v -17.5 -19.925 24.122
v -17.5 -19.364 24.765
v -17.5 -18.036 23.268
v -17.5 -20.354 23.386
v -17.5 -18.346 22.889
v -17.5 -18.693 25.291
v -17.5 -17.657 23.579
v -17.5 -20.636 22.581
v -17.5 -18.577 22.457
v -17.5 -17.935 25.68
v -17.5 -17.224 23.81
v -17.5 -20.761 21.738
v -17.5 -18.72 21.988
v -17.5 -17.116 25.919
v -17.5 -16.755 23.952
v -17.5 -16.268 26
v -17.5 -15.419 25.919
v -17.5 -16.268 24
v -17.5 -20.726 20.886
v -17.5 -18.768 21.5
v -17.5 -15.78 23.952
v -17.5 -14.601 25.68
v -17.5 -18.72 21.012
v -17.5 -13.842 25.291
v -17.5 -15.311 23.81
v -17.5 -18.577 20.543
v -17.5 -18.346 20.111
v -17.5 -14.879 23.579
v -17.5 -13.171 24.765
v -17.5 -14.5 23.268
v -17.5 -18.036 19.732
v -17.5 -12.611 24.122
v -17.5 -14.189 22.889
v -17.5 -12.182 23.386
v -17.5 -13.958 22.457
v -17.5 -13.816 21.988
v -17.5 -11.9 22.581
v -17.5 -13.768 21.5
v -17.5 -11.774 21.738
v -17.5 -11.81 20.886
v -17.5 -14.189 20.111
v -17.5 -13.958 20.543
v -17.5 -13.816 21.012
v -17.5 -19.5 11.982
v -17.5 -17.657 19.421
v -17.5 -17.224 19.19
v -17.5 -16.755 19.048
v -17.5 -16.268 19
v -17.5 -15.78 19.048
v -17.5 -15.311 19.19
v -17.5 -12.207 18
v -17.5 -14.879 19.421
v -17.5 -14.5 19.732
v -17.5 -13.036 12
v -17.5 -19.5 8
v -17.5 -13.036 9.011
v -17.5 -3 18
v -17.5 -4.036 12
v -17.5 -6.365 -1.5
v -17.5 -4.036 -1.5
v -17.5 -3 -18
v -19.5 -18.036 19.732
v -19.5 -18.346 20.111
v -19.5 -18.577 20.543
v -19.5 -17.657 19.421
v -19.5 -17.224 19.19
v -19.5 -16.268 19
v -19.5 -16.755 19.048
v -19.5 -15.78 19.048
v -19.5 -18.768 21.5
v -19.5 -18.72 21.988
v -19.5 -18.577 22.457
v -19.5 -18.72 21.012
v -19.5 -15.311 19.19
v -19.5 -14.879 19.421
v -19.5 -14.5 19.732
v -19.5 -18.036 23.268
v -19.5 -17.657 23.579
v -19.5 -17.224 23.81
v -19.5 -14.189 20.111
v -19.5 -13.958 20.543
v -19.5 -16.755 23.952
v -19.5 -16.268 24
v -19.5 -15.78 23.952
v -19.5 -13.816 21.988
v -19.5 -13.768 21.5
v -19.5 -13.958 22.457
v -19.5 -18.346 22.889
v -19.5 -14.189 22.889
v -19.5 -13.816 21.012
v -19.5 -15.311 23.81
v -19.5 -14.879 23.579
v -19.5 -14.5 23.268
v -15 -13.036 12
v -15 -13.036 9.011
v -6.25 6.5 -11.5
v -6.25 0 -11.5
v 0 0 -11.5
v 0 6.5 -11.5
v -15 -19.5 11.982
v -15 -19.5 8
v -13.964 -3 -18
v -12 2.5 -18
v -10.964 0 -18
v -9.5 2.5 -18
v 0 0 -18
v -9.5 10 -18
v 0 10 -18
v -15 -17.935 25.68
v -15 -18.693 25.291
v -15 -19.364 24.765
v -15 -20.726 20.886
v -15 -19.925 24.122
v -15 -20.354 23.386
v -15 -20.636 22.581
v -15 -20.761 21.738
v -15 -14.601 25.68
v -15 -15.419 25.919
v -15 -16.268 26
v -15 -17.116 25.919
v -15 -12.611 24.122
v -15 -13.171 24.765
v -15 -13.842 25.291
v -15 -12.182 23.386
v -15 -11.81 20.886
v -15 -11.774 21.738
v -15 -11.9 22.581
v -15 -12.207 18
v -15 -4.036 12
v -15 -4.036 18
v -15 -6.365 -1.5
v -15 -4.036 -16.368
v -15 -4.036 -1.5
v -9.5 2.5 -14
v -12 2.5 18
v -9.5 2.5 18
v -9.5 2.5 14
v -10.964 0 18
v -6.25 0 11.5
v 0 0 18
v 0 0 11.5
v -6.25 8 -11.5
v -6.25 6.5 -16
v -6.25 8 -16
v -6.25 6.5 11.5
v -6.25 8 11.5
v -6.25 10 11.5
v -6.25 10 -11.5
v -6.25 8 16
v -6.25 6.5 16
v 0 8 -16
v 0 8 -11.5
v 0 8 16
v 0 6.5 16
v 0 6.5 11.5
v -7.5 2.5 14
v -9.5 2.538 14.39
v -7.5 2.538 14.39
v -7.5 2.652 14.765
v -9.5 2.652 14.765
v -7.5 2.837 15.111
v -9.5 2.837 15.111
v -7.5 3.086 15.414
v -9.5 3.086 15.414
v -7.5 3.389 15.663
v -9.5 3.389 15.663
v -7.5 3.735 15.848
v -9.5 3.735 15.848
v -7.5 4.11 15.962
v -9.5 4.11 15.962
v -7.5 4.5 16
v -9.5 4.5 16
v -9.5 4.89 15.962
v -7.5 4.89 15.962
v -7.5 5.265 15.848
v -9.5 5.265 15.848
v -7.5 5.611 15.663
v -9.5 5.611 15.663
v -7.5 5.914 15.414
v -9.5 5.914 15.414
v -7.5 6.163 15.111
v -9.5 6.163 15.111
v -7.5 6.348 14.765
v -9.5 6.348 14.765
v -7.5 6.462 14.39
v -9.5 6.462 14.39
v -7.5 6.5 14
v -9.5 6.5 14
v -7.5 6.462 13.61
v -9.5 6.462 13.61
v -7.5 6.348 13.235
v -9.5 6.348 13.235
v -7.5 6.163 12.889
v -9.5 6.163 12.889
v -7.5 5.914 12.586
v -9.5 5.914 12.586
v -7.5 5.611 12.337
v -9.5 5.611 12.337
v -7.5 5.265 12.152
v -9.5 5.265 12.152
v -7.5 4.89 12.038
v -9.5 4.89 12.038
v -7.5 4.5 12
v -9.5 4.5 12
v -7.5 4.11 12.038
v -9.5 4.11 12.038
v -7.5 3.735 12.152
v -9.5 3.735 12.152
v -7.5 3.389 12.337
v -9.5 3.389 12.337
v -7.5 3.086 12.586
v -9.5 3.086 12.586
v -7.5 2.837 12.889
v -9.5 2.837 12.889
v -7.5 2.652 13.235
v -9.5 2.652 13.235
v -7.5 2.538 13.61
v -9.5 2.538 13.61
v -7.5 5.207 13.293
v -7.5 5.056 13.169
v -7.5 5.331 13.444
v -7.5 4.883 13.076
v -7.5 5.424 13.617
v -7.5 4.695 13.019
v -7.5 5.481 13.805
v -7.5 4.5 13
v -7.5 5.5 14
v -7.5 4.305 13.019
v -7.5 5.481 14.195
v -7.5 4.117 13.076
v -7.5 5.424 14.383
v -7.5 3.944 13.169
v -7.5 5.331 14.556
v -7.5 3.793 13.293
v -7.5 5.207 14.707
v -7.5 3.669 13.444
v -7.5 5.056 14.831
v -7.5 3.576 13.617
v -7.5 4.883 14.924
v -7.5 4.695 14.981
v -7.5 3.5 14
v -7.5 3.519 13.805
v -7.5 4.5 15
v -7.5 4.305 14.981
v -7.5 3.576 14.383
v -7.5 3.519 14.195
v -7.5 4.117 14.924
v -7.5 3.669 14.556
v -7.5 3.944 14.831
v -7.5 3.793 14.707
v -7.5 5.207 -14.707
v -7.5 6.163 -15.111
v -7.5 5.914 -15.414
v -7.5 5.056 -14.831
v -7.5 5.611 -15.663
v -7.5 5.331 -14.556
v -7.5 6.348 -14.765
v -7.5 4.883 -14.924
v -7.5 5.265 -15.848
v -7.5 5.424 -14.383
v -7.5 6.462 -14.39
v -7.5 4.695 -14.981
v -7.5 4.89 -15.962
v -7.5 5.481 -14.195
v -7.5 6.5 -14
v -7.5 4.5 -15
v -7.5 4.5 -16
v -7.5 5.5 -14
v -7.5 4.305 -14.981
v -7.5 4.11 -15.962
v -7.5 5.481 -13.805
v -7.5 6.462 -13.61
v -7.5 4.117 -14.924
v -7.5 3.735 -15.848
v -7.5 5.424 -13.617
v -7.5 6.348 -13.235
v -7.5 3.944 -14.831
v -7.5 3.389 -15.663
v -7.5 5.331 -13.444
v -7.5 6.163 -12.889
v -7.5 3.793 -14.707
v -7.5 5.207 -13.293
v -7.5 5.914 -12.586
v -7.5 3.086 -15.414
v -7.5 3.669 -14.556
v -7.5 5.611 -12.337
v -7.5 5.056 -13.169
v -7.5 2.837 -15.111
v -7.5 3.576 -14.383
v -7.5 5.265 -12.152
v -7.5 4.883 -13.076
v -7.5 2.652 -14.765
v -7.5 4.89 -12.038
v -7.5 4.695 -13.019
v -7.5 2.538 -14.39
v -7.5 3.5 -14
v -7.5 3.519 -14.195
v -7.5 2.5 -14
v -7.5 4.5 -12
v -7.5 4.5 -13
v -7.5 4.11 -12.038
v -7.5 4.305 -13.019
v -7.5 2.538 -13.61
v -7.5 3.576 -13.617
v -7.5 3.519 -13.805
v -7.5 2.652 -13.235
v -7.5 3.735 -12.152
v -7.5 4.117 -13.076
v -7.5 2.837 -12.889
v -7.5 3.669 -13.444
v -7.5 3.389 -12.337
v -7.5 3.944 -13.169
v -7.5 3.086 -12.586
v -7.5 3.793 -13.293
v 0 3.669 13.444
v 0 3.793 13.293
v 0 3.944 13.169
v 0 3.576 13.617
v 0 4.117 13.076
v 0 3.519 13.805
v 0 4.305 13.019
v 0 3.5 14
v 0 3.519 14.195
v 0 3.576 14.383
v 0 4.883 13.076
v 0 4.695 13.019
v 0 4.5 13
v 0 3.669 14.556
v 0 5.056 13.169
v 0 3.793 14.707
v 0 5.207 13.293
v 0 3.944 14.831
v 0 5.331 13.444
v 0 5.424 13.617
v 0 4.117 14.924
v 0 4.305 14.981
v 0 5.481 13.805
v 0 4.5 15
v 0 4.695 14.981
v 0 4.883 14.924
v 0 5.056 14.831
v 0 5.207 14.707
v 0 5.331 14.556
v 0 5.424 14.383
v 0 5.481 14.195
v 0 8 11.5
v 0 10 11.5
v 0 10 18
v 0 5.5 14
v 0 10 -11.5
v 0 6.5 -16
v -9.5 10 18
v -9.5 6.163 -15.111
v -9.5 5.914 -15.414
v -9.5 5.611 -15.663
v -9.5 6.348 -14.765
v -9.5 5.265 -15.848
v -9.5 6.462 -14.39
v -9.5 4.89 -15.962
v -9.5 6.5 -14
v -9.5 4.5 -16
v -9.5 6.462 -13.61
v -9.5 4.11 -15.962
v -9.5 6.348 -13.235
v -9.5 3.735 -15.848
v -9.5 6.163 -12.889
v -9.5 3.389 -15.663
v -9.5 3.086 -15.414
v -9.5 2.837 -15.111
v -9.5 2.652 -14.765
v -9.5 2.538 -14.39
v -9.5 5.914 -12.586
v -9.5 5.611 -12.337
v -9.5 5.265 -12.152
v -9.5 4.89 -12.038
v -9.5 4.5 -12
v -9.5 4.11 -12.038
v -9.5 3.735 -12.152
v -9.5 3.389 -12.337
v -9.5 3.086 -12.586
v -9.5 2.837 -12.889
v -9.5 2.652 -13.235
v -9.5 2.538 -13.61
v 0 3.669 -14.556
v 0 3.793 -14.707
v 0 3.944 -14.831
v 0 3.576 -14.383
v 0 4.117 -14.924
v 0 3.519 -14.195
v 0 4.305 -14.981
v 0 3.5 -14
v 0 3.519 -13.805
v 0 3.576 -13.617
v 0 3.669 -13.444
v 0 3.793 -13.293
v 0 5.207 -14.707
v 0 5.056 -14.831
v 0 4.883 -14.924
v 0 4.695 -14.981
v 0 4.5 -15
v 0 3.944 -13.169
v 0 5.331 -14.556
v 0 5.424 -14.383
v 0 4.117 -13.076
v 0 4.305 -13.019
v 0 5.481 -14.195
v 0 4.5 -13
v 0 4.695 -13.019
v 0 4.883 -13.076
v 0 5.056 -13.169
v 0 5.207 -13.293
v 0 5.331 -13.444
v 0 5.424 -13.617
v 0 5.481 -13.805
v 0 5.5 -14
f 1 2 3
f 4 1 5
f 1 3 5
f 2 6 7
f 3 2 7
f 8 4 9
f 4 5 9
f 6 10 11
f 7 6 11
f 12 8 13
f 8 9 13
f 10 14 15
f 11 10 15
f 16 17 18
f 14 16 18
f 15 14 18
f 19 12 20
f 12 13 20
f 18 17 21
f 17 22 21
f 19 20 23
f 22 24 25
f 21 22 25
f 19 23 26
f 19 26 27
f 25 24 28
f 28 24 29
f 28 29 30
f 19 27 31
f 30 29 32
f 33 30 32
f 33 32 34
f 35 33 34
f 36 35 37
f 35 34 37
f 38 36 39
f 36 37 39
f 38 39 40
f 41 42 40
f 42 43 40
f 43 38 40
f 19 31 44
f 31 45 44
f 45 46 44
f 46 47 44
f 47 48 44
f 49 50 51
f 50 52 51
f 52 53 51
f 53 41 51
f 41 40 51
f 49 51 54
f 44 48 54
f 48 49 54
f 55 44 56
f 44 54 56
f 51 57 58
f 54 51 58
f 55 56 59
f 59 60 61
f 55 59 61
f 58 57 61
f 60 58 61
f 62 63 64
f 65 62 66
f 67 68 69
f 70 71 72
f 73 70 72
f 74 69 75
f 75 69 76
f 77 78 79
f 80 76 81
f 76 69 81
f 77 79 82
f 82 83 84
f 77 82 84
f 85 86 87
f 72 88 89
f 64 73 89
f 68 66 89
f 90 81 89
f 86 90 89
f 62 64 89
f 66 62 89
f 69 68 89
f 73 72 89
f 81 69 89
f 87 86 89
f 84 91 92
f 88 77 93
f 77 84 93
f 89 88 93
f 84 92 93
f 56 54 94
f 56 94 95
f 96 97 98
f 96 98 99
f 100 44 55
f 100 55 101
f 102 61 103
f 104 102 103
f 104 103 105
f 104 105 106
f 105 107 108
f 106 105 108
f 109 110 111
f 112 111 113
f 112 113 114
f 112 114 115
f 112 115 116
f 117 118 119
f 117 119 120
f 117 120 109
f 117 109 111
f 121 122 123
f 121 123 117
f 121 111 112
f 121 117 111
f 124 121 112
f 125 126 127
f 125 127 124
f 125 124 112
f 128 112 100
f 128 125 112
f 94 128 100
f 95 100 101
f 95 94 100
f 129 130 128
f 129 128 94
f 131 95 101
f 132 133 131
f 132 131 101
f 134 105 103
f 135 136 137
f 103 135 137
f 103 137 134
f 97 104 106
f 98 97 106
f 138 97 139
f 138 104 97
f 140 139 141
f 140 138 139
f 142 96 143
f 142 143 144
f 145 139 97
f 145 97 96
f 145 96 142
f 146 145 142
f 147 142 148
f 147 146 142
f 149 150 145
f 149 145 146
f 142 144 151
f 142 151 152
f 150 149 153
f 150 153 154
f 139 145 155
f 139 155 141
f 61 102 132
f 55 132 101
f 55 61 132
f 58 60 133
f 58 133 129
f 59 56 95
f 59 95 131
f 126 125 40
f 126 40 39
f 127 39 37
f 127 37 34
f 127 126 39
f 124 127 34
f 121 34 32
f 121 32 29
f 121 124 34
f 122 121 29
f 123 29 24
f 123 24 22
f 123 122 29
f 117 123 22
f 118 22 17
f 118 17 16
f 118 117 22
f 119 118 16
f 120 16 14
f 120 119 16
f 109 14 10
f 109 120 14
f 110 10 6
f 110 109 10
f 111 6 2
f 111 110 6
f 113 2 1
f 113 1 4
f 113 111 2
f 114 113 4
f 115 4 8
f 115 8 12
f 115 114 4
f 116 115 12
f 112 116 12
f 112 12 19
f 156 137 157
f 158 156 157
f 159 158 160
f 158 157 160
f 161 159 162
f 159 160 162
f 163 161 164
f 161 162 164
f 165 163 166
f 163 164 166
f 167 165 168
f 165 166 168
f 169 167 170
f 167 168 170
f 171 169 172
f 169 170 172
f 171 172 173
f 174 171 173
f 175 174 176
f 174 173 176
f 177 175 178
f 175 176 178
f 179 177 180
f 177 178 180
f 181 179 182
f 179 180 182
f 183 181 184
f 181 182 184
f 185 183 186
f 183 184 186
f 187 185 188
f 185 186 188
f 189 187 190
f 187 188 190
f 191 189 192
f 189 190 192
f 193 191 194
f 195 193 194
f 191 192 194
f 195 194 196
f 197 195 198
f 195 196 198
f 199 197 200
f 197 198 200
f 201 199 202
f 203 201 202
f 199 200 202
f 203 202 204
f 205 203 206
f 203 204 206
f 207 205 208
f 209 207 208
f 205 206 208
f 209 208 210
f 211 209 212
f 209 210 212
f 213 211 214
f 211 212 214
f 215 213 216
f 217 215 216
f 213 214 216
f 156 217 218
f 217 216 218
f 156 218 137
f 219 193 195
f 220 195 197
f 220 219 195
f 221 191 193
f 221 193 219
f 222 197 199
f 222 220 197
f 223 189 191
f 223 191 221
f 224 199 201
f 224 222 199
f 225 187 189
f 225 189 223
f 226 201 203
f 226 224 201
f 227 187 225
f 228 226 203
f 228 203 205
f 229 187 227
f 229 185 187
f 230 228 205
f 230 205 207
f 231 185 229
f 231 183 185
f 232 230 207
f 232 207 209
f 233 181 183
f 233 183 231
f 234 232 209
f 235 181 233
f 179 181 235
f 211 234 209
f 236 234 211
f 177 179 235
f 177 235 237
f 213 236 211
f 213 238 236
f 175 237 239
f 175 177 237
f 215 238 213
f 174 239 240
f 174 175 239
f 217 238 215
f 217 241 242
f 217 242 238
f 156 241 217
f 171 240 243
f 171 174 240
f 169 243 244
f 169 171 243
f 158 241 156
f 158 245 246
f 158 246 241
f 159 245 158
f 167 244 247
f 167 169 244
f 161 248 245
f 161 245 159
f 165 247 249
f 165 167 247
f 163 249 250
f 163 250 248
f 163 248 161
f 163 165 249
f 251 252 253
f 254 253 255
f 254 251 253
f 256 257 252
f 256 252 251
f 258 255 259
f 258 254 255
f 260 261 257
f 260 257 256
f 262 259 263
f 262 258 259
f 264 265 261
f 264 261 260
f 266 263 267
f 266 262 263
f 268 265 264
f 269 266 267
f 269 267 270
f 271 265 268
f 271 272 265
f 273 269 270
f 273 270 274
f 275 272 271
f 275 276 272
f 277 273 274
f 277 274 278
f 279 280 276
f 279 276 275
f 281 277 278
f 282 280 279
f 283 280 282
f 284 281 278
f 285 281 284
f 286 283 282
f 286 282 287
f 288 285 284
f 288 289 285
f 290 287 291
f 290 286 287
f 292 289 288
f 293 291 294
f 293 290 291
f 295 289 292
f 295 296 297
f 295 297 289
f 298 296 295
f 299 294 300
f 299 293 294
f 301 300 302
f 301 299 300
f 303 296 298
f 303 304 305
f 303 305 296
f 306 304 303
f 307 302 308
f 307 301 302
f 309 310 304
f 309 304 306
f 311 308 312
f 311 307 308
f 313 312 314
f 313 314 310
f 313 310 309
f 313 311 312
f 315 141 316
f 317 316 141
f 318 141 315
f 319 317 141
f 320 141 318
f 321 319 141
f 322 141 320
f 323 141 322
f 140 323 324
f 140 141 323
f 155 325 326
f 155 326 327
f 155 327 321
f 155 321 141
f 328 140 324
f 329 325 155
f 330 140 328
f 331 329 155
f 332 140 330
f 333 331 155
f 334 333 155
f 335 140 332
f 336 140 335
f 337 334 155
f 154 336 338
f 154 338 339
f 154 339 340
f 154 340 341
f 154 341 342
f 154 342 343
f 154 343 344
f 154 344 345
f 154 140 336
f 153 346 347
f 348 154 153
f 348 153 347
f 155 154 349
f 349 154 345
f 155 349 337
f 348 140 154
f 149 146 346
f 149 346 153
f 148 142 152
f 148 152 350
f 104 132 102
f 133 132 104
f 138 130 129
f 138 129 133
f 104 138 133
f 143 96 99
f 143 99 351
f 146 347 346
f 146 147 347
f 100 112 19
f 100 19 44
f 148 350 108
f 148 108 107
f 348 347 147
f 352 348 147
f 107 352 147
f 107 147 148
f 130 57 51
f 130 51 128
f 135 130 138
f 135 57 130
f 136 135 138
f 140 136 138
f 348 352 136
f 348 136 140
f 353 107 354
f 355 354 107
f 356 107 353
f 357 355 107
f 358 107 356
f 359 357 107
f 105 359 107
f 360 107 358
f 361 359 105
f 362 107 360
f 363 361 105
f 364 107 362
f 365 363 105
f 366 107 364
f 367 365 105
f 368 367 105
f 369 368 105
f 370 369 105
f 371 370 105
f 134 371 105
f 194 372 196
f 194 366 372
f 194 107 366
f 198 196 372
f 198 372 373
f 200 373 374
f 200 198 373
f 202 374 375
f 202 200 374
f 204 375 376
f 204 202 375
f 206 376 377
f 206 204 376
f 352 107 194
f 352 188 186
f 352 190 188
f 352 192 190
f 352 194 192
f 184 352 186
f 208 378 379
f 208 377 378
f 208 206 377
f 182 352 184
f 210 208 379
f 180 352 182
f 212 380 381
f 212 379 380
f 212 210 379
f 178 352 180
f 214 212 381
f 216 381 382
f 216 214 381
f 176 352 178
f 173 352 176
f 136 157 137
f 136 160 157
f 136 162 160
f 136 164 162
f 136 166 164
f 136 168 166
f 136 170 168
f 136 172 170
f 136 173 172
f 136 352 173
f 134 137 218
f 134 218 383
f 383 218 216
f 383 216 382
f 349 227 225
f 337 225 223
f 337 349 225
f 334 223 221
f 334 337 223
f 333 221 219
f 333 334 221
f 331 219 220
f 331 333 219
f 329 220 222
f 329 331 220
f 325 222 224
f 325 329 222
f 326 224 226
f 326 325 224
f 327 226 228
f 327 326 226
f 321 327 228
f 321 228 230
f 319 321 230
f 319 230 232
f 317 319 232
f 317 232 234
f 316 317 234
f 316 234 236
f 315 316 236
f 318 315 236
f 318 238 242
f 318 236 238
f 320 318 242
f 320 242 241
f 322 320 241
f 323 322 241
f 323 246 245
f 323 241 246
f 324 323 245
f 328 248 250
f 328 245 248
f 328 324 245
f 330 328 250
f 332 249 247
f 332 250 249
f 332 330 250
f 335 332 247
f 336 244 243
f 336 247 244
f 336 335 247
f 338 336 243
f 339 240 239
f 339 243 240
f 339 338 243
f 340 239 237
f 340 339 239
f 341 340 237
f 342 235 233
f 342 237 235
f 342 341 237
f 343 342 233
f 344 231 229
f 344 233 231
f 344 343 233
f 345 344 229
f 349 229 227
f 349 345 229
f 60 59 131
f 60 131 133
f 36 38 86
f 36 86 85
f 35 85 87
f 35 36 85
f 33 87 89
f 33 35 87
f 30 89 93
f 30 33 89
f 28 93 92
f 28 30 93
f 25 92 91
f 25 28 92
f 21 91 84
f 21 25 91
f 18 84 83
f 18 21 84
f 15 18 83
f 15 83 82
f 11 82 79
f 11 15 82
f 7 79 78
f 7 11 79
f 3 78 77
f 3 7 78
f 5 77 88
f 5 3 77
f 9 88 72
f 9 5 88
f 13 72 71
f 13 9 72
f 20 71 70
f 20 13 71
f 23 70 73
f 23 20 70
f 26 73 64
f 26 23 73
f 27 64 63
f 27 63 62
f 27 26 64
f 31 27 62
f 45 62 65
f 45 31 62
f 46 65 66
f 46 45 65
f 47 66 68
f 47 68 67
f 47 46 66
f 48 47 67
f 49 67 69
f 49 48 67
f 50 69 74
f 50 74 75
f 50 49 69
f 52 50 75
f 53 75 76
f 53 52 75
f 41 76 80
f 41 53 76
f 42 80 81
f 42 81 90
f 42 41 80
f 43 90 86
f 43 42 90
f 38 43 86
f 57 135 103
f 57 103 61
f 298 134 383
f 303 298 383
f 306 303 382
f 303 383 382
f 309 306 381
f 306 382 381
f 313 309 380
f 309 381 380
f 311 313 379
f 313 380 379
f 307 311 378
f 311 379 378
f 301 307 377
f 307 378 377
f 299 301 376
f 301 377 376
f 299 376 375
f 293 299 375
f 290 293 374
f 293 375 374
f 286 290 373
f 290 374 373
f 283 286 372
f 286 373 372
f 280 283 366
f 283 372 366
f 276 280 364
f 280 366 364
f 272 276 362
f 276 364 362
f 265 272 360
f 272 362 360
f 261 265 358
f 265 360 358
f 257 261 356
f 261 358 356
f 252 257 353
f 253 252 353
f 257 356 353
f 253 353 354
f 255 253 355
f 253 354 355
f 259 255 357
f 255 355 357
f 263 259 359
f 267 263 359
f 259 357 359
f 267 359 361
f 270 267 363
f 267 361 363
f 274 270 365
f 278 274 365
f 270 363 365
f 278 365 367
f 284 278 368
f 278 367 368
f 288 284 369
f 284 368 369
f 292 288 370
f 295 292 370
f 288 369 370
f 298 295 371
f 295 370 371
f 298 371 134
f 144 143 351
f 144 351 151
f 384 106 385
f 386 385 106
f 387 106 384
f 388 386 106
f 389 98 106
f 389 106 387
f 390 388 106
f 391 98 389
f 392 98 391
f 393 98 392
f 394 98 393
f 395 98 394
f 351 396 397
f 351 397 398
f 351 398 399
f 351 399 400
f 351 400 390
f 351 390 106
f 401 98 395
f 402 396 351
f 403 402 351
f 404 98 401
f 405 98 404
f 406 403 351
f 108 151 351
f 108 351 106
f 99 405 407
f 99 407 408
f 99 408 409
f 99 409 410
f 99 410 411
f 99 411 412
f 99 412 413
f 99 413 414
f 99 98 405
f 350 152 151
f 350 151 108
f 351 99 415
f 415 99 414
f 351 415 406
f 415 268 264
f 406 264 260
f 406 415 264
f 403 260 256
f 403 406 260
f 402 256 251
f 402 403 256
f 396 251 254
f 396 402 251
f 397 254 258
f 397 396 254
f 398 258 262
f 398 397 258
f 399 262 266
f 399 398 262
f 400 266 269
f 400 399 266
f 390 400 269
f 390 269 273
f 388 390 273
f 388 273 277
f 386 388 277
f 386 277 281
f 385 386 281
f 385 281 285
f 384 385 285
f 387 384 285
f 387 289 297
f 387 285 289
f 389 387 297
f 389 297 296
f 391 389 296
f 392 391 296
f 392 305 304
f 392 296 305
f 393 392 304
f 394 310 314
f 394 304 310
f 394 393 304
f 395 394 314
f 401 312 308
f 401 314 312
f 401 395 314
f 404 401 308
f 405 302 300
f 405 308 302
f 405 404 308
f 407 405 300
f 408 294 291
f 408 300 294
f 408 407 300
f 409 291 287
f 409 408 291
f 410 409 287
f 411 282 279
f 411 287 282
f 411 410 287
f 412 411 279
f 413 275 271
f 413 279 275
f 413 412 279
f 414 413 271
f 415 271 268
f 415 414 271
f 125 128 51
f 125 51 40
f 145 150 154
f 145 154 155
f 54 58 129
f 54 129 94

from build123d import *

# Parameters (mm, degrees)
EXTRUDE_1_DEPTH     = 18
CUT_EXTRUDE_1_REACH = 33.788
CUT_EXTRUDE_2_DEPTH = 6.25
SKETCH_4_R          = 1
CUT_EXTRUDE_3_DEPTH = 39.303882092
SKETCH_5_R          = 2
CUT_EXTRUDE_4_DEPTH = 2
EXTRUDE_3_DEPTH     = 2.5
EXTRUDE_START       = -2.5
SKETCH_6_3_R        = 2.5
EXTRUDE_4_DEPTH     = 2


with BuildPart() as part:
    # 草图1 → 凸台-拉伸1 (new, symmetric)
    with BuildSketch(Plane.XY):
        Polygon((0, 0), (0, 10), (-9.5, 10), (-9.5, 2.5), (-12, 2.5), (-17.5, -3), (-17.5, -19.5), (-15, -19.5), (-15, -4.035533906), (-10.964466094, 0), align=None)
    extrude(amount=EXTRUDE_1_DEPTH, both=True)

    # 草图2 → 切除-拉伸1 (cut, up to next)
    with BuildSketch(Plane.ZY.offset(17.5), mode=Mode.PRIVATE) as cut_extrude_1_sk1:
        Polygon((-1.5, -6.364922728), (-1.5, -4.035533906), (12, -4.035533906), (12, -13.035533906), (9.011266099, -13.035533906), align=None)
    cut_extrude_1_tool1 = extrude(cut_extrude_1_sk1.sketch, amount=-CUT_EXTRUDE_1_REACH, mode=Mode.PRIVATE) & part.part
    # 草图2 → 切除-拉伸1 (cut, up to next)
    with BuildSketch(Plane.ZY.offset(17.5), mode=Mode.PRIVATE) as cut_extrude_1_sk2:
        Polygon((-18, -3), (8, -19.5), (-18, -19.5), align=None)
    cut_extrude_1_tool2 = extrude(cut_extrude_1_sk2.sketch, amount=-CUT_EXTRUDE_1_REACH, mode=Mode.PRIVATE) & part.part
    add(cut_extrude_1_tool1.solids().sort_by_distance((-17.5, -7.612266, 6.566584))[0], mode=Mode.SUBTRACT)
    add(cut_extrude_1_tool2.solids().sort_by_distance((-17.5, -14, -9.333333))[0], mode=Mode.SUBTRACT)

    # 草图3 → 切除-拉伸2 (cut, symmetric)
    with BuildSketch(Plane(origin=(0, 8.894521129, 0.833176928), x_dir=(0, -1, 0), z_dir=(-1, 0, 0))):
        Polygon((2.394521129, 15.166823072), (2.394521129, 10.666823072), (8.894521129, 10.666823072), (8.894521129, -12.333176928), (2.394521129, -12.333176928), (2.394521129, -16.833176928), (0.894521129, -16.833176928), (0.894521129, -12.333176928), (-3.105478871, -12.333176928), (-3.105478871, 10.666823072), (0.894521129, 10.666823072), (0.894521129, 15.166823072), align=None)
    extrude(amount=CUT_EXTRUDE_2_DEPTH, both=True, mode=Mode.SUBTRACT)

    # 草图4 → 切除-拉伸3 (cut, through all)
    with BuildSketch(Plane(origin=(0, 8.894521129, 0.833176928), x_dir=(0, -1, 0), z_dir=(-1, 0, 0))):
        with Locations(Location((4.394521129, -14.833176928, 0), (0, 0, 180))):
            Circle(SKETCH_4_R)
        with Locations(Location((4.394521129, 13.166823072, 0), (0, 0, 180))):
            Circle(SKETCH_4_R)
    extrude(amount=CUT_EXTRUDE_3_DEPTH, mode=Mode.SUBTRACT)

    # 草图5 → 切除-拉伸4 (cut)
    with BuildSketch(Plane.ZY.offset(9.5)):
        with Locations(Location((14, 4.5, 0), (0, 0, 270))):
            Circle(SKETCH_5_R)
        with Locations(Location((-14, 4.5, 0), (0, 0, 270))):
            Circle(SKETCH_5_R)
    extrude(amount=-CUT_EXTRUDE_4_DEPTH, mode=Mode.SUBTRACT)

    # 草图6 → 凸台-拉伸3 (add)
    with BuildSketch(Plane(origin=(-15, 0, 0), x_dir=(0, 0, -1), z_dir=(1, 0, 0))):
        with BuildLine():
            ThreePointArc((-20.886363636, -11.809802124), (-26, -16.267766953), (-20.886363636, -20.725731782))
            Line((-20.886363636, -20.725731782), (-11.98162869, -19.5))
            Line((-11.98162869, -19.5), (-18, -19.5))
            Line((-18, -19.5), (-18, -12.207108463))
            Line((-18, -12.207108463), (-20.886363636, -11.809802124))
        make_face()
    extrude(amount=-EXTRUDE_3_DEPTH)

    # 草图6<3> → 凸台-拉伸4 (add)
    with BuildSketch(Plane(origin=(-15, 0, 0), x_dir=(0, 0, -1), z_dir=(1, 0, 0)).offset(EXTRUDE_START)):
        with Locations(Location((-21.5, -16.267766953, 0), (0, 0, 90))):
            Circle(SKETCH_6_3_R)
    extrude(amount=-EXTRUDE_4_DEPTH)


solid = part.part
